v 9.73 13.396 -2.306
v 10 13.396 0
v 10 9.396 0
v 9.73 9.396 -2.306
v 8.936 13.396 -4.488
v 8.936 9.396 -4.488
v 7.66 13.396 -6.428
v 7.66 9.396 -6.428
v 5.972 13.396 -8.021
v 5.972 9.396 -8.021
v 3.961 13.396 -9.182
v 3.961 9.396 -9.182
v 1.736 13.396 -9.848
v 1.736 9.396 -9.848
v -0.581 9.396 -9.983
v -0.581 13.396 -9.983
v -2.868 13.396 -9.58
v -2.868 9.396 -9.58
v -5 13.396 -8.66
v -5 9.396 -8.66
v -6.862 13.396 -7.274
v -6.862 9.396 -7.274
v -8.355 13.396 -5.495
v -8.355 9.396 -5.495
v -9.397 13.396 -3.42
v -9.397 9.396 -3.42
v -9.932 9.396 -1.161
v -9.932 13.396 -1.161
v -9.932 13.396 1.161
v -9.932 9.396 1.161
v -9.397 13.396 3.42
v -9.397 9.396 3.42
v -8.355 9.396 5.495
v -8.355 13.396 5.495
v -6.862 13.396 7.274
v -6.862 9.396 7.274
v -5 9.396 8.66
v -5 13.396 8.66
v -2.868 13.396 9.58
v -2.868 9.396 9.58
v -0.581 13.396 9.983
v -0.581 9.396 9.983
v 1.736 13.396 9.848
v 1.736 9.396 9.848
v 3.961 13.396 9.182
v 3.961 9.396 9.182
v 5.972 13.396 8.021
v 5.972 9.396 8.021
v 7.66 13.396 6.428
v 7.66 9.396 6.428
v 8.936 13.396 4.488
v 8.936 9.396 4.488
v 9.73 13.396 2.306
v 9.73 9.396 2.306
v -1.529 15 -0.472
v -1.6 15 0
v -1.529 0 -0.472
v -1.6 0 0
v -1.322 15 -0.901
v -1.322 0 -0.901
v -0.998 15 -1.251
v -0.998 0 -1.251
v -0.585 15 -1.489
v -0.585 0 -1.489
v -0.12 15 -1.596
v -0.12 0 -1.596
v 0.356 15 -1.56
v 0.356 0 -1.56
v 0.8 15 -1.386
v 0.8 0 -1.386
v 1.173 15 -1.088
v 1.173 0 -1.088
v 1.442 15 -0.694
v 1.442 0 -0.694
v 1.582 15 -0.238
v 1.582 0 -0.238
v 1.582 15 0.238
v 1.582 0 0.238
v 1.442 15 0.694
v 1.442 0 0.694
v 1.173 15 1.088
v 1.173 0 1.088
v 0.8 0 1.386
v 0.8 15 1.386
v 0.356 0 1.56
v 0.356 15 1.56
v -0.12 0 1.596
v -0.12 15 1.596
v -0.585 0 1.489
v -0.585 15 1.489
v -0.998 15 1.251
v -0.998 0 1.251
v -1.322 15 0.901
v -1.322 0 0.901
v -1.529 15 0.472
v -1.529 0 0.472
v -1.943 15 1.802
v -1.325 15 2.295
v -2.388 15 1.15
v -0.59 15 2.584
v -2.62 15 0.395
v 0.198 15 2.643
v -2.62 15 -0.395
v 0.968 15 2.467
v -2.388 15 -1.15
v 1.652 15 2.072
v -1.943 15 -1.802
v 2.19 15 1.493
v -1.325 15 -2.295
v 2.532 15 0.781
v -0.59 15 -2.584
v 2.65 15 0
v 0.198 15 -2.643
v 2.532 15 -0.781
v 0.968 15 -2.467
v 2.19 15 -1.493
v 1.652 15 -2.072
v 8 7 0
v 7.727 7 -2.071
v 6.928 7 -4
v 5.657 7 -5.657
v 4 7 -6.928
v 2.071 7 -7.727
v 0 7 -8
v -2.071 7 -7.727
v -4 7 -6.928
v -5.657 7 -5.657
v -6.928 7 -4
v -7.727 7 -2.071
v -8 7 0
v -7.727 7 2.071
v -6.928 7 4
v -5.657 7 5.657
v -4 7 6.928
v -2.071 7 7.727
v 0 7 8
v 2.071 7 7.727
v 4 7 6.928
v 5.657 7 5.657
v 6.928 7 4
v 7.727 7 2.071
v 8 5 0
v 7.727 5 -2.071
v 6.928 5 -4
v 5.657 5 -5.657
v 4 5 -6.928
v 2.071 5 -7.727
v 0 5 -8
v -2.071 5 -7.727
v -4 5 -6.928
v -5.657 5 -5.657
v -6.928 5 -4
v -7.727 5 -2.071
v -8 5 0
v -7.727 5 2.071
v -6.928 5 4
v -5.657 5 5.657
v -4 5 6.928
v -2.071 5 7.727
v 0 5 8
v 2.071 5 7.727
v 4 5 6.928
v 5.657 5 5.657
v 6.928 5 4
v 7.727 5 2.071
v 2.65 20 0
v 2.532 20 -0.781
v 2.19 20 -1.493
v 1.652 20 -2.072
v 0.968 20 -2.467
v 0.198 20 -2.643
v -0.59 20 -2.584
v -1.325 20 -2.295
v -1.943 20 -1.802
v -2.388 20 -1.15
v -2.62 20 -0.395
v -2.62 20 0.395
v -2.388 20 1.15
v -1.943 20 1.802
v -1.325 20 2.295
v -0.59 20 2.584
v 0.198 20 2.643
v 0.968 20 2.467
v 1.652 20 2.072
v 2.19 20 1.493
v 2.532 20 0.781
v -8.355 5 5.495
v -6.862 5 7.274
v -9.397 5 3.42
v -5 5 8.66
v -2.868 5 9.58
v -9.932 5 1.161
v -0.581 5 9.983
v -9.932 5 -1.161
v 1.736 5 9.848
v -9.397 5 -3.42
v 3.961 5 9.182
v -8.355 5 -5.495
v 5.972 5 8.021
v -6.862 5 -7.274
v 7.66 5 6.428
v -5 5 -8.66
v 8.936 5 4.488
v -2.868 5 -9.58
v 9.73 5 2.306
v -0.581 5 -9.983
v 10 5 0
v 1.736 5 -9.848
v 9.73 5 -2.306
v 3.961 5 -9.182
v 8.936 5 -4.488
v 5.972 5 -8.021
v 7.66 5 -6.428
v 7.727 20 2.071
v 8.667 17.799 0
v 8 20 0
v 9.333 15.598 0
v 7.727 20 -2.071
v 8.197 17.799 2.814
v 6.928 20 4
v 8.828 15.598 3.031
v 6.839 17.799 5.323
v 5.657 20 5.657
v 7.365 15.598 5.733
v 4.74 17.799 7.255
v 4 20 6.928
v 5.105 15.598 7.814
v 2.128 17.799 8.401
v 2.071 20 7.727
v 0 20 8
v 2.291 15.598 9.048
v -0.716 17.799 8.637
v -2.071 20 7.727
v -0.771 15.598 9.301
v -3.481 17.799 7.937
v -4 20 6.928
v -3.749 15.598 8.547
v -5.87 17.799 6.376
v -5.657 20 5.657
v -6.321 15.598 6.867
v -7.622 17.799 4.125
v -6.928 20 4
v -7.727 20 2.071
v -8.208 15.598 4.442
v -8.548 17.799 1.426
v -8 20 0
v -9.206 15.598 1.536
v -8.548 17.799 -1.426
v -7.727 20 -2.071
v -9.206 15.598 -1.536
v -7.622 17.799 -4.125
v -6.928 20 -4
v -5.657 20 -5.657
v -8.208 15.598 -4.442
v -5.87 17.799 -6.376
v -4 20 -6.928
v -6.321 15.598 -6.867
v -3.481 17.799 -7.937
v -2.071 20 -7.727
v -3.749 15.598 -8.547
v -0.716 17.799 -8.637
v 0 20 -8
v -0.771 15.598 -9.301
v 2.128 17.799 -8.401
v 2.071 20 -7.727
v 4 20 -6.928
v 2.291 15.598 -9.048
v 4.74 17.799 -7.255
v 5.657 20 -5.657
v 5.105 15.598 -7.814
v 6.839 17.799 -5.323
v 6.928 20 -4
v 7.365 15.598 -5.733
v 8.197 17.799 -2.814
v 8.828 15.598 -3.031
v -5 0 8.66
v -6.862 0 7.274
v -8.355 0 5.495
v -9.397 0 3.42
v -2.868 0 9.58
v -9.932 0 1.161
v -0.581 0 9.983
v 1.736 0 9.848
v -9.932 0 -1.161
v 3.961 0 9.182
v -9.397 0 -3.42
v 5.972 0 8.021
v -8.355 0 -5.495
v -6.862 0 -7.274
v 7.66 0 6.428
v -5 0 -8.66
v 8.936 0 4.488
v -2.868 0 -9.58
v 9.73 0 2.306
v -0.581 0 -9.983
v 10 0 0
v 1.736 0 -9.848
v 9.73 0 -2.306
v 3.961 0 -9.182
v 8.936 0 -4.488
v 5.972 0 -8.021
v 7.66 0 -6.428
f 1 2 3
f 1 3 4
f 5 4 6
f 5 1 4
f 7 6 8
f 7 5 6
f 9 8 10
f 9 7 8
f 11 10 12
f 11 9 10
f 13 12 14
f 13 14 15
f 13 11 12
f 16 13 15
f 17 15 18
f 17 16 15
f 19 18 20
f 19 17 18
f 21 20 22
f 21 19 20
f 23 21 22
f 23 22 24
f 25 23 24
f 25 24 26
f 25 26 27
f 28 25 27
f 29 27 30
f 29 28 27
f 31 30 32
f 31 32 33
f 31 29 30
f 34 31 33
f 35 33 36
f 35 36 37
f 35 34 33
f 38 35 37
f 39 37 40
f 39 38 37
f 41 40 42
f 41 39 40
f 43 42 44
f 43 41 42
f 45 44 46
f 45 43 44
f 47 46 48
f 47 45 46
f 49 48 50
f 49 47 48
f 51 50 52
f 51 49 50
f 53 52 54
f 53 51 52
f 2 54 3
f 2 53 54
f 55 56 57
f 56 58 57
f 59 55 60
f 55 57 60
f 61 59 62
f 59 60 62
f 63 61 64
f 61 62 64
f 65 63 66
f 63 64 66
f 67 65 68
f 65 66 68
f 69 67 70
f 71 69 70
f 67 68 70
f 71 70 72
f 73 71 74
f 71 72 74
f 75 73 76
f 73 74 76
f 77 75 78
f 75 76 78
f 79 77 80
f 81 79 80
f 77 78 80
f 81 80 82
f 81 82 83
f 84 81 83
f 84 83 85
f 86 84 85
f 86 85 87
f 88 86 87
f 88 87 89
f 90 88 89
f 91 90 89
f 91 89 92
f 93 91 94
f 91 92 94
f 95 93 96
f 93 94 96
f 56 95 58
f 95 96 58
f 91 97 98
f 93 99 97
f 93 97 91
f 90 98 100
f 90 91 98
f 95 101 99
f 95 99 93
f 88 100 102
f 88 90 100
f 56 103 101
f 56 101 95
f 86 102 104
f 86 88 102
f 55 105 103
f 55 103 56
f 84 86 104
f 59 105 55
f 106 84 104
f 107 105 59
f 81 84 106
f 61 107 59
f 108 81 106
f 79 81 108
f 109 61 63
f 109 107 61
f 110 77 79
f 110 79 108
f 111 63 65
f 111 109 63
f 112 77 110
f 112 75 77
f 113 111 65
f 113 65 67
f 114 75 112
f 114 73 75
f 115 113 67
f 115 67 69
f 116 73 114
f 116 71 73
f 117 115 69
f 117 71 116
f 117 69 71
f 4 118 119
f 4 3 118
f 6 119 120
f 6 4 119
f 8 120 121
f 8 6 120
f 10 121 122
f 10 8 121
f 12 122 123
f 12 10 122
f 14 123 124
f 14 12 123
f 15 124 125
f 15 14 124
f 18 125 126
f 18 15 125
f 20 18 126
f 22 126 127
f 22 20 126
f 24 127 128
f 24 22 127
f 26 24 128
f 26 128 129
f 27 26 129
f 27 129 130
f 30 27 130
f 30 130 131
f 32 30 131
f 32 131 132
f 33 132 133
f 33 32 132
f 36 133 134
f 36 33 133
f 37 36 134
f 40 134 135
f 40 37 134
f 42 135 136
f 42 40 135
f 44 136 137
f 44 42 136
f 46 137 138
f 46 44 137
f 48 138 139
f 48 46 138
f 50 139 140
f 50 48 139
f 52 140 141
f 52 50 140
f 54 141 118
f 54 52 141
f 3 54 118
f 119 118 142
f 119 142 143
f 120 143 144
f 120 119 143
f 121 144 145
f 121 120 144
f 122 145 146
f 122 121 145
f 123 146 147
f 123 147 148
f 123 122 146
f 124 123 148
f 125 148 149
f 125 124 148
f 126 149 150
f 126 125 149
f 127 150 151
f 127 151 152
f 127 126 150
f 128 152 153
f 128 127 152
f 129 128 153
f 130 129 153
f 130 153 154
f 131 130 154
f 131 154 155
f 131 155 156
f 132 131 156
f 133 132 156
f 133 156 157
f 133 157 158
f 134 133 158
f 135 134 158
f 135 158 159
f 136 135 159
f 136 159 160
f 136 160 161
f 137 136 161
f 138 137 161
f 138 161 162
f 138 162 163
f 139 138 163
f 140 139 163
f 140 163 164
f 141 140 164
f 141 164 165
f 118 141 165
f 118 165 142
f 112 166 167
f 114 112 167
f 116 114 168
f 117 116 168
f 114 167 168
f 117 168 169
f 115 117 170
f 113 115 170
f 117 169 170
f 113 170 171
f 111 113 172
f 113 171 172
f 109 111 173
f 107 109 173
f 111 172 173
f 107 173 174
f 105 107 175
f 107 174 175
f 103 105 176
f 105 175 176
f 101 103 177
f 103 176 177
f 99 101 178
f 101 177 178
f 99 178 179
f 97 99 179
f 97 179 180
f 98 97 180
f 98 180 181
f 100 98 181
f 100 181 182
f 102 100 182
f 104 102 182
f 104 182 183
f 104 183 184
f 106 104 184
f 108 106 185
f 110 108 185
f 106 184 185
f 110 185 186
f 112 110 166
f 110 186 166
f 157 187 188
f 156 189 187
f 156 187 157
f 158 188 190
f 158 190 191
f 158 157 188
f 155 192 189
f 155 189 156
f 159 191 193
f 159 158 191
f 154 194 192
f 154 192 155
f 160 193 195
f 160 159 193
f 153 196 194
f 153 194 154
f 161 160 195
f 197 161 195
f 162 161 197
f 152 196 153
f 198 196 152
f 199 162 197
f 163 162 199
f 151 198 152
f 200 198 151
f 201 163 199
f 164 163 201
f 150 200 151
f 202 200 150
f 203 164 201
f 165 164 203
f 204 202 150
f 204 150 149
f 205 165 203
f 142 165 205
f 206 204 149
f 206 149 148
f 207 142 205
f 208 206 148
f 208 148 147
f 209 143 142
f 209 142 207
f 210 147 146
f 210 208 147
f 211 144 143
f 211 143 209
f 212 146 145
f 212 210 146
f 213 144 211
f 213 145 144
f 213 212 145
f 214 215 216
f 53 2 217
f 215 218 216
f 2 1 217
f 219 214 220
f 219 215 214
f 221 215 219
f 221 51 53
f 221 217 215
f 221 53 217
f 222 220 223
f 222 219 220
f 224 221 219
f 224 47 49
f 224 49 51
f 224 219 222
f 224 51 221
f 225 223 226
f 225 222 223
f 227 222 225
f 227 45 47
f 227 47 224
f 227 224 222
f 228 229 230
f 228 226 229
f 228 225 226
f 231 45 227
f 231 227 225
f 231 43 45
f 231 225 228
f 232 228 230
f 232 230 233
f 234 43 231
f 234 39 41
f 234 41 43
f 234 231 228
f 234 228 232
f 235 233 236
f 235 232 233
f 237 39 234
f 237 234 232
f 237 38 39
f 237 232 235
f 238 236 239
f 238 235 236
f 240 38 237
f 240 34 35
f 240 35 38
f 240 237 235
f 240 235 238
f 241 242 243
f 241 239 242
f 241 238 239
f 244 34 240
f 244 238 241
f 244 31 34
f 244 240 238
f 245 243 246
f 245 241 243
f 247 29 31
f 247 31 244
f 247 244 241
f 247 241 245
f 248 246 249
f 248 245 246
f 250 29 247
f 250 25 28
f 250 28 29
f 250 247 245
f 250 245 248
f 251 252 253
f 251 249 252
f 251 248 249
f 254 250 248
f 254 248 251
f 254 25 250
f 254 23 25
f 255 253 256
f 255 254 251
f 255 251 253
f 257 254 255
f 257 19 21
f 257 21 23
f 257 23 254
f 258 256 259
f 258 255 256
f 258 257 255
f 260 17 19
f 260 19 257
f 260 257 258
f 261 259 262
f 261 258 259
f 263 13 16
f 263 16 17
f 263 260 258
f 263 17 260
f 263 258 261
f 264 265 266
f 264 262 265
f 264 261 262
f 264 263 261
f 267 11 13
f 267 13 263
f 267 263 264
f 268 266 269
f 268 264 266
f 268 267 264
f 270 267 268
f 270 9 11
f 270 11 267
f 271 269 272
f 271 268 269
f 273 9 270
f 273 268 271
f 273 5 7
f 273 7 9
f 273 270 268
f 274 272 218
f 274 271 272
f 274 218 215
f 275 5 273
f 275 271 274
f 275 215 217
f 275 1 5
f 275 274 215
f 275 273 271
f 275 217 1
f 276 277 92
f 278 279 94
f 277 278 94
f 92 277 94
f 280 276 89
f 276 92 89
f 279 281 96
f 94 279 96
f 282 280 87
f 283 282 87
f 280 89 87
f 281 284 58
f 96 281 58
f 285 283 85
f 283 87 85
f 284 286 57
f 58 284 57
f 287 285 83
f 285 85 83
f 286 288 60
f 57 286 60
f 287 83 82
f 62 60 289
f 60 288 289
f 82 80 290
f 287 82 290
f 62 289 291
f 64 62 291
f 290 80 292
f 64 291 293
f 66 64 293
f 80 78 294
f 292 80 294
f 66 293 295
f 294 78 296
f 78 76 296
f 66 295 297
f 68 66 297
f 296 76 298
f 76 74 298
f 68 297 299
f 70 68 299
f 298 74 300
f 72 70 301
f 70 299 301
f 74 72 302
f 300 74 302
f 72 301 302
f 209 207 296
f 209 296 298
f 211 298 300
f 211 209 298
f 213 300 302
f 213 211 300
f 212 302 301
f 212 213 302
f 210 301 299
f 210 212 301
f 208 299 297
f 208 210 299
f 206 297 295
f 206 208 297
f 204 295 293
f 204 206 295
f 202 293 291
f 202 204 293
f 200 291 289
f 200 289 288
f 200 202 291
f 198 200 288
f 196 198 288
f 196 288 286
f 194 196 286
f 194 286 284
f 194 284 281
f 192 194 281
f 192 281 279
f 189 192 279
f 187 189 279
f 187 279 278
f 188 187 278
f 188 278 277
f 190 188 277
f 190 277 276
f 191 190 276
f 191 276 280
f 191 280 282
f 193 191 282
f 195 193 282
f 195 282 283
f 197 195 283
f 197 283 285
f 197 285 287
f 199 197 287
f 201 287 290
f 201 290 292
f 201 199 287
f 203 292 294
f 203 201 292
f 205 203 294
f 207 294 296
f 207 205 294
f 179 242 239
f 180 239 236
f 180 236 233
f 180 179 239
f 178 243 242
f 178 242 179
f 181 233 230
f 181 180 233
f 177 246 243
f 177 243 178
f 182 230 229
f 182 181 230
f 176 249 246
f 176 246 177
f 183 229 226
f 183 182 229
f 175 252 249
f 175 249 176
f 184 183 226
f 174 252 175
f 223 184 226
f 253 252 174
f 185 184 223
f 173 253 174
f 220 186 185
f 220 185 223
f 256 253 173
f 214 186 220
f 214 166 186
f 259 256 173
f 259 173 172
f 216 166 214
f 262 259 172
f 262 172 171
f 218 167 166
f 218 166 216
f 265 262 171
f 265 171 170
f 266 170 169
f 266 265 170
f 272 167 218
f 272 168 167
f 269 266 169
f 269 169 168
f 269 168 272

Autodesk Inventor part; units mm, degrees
ref_plane "YZ Plane" through (0, 0, 0) normal (1, 0, 0) x (0, 1, 0)
ref_plane "XZ Plane" through (0, 0, 0) normal (0, 1, 0) x (-1, 0, 0)
ref_plane "XY Plane" through (0, 0, 0) normal (0, 0, 1) x (1, 0, 0)
sketch "Sketch3" plane through (0, 0, 0) normal (0, 0, 1) x (1, 0, 0)
  line L0 (0, 0) -> (10, 0)
  line L1 (0, 0) -> (0, 20)
  line L2 (0, 20) -> (8, 20)
  line L3 (10, 0) -> (10, 5)
  line L4 (10, 5) -> (8, 5)
  line L5 (8, 5) -> (8, 7)
  line L6 (8, 7) -> (10, 9.3965)
  line L7 (10, 9.3965) -> (10, 13.3965)
  line L8 (10, 13.3965) -> (8, 20)
  dimension "d17" = 10
  dimension "d18" = 20
  dimension "d19" = 8
  dimension "d40" = 5
  dimension "d43" = 2
  dimension "d44" = 4
  dimension "d45" = 2
revolve "Revolution1" add sketch "Sketch3" angle 360 about axis through (0, 0, 0) along (0, 1, 0)
sketch "Sketch4" plane through (0, 0, 0) normal (0, 1, 0) x (-1, 0, 0)
  circle A0 centre (0, 0) radius 1.6
  dimension "d27" = 3.2
extrude "Extrusion3" cut sketch "Sketch4" along normal through all
sketch "Sketch5" plane through (0, 20, 0) normal (0, 1, 0) x (1, 0, 0)
  circle A0 centre (0, 0) radius 2.65
  dimension "d30" = 5.3
extrude "Extrusion4" cut sketch "Sketch5" against normal blind 5
sketch "Sketch6" plane through (0, 0, 0) normal (0, -1, 0) x (1, 0, 0)
  circle A0 centre (-6, 0) radius 1.5
  circle A1 centre (6, 0) radius 1.5
  circle A2 centre (0, 0) radius 1.6 projected
  line L0 (-6, 0) -> (0, 0) construction
  line L1 (0, 0) -> (6, 0) construction
  dimension "d33" = 3
  dimension "d35" = 3
  dimension "d47" = 6
extrude "Extrusion5" [suppressed]
equation "\"d35\" = d33"
equation "\"d47\" = 2 * d33"
properties part number "modular-post"
